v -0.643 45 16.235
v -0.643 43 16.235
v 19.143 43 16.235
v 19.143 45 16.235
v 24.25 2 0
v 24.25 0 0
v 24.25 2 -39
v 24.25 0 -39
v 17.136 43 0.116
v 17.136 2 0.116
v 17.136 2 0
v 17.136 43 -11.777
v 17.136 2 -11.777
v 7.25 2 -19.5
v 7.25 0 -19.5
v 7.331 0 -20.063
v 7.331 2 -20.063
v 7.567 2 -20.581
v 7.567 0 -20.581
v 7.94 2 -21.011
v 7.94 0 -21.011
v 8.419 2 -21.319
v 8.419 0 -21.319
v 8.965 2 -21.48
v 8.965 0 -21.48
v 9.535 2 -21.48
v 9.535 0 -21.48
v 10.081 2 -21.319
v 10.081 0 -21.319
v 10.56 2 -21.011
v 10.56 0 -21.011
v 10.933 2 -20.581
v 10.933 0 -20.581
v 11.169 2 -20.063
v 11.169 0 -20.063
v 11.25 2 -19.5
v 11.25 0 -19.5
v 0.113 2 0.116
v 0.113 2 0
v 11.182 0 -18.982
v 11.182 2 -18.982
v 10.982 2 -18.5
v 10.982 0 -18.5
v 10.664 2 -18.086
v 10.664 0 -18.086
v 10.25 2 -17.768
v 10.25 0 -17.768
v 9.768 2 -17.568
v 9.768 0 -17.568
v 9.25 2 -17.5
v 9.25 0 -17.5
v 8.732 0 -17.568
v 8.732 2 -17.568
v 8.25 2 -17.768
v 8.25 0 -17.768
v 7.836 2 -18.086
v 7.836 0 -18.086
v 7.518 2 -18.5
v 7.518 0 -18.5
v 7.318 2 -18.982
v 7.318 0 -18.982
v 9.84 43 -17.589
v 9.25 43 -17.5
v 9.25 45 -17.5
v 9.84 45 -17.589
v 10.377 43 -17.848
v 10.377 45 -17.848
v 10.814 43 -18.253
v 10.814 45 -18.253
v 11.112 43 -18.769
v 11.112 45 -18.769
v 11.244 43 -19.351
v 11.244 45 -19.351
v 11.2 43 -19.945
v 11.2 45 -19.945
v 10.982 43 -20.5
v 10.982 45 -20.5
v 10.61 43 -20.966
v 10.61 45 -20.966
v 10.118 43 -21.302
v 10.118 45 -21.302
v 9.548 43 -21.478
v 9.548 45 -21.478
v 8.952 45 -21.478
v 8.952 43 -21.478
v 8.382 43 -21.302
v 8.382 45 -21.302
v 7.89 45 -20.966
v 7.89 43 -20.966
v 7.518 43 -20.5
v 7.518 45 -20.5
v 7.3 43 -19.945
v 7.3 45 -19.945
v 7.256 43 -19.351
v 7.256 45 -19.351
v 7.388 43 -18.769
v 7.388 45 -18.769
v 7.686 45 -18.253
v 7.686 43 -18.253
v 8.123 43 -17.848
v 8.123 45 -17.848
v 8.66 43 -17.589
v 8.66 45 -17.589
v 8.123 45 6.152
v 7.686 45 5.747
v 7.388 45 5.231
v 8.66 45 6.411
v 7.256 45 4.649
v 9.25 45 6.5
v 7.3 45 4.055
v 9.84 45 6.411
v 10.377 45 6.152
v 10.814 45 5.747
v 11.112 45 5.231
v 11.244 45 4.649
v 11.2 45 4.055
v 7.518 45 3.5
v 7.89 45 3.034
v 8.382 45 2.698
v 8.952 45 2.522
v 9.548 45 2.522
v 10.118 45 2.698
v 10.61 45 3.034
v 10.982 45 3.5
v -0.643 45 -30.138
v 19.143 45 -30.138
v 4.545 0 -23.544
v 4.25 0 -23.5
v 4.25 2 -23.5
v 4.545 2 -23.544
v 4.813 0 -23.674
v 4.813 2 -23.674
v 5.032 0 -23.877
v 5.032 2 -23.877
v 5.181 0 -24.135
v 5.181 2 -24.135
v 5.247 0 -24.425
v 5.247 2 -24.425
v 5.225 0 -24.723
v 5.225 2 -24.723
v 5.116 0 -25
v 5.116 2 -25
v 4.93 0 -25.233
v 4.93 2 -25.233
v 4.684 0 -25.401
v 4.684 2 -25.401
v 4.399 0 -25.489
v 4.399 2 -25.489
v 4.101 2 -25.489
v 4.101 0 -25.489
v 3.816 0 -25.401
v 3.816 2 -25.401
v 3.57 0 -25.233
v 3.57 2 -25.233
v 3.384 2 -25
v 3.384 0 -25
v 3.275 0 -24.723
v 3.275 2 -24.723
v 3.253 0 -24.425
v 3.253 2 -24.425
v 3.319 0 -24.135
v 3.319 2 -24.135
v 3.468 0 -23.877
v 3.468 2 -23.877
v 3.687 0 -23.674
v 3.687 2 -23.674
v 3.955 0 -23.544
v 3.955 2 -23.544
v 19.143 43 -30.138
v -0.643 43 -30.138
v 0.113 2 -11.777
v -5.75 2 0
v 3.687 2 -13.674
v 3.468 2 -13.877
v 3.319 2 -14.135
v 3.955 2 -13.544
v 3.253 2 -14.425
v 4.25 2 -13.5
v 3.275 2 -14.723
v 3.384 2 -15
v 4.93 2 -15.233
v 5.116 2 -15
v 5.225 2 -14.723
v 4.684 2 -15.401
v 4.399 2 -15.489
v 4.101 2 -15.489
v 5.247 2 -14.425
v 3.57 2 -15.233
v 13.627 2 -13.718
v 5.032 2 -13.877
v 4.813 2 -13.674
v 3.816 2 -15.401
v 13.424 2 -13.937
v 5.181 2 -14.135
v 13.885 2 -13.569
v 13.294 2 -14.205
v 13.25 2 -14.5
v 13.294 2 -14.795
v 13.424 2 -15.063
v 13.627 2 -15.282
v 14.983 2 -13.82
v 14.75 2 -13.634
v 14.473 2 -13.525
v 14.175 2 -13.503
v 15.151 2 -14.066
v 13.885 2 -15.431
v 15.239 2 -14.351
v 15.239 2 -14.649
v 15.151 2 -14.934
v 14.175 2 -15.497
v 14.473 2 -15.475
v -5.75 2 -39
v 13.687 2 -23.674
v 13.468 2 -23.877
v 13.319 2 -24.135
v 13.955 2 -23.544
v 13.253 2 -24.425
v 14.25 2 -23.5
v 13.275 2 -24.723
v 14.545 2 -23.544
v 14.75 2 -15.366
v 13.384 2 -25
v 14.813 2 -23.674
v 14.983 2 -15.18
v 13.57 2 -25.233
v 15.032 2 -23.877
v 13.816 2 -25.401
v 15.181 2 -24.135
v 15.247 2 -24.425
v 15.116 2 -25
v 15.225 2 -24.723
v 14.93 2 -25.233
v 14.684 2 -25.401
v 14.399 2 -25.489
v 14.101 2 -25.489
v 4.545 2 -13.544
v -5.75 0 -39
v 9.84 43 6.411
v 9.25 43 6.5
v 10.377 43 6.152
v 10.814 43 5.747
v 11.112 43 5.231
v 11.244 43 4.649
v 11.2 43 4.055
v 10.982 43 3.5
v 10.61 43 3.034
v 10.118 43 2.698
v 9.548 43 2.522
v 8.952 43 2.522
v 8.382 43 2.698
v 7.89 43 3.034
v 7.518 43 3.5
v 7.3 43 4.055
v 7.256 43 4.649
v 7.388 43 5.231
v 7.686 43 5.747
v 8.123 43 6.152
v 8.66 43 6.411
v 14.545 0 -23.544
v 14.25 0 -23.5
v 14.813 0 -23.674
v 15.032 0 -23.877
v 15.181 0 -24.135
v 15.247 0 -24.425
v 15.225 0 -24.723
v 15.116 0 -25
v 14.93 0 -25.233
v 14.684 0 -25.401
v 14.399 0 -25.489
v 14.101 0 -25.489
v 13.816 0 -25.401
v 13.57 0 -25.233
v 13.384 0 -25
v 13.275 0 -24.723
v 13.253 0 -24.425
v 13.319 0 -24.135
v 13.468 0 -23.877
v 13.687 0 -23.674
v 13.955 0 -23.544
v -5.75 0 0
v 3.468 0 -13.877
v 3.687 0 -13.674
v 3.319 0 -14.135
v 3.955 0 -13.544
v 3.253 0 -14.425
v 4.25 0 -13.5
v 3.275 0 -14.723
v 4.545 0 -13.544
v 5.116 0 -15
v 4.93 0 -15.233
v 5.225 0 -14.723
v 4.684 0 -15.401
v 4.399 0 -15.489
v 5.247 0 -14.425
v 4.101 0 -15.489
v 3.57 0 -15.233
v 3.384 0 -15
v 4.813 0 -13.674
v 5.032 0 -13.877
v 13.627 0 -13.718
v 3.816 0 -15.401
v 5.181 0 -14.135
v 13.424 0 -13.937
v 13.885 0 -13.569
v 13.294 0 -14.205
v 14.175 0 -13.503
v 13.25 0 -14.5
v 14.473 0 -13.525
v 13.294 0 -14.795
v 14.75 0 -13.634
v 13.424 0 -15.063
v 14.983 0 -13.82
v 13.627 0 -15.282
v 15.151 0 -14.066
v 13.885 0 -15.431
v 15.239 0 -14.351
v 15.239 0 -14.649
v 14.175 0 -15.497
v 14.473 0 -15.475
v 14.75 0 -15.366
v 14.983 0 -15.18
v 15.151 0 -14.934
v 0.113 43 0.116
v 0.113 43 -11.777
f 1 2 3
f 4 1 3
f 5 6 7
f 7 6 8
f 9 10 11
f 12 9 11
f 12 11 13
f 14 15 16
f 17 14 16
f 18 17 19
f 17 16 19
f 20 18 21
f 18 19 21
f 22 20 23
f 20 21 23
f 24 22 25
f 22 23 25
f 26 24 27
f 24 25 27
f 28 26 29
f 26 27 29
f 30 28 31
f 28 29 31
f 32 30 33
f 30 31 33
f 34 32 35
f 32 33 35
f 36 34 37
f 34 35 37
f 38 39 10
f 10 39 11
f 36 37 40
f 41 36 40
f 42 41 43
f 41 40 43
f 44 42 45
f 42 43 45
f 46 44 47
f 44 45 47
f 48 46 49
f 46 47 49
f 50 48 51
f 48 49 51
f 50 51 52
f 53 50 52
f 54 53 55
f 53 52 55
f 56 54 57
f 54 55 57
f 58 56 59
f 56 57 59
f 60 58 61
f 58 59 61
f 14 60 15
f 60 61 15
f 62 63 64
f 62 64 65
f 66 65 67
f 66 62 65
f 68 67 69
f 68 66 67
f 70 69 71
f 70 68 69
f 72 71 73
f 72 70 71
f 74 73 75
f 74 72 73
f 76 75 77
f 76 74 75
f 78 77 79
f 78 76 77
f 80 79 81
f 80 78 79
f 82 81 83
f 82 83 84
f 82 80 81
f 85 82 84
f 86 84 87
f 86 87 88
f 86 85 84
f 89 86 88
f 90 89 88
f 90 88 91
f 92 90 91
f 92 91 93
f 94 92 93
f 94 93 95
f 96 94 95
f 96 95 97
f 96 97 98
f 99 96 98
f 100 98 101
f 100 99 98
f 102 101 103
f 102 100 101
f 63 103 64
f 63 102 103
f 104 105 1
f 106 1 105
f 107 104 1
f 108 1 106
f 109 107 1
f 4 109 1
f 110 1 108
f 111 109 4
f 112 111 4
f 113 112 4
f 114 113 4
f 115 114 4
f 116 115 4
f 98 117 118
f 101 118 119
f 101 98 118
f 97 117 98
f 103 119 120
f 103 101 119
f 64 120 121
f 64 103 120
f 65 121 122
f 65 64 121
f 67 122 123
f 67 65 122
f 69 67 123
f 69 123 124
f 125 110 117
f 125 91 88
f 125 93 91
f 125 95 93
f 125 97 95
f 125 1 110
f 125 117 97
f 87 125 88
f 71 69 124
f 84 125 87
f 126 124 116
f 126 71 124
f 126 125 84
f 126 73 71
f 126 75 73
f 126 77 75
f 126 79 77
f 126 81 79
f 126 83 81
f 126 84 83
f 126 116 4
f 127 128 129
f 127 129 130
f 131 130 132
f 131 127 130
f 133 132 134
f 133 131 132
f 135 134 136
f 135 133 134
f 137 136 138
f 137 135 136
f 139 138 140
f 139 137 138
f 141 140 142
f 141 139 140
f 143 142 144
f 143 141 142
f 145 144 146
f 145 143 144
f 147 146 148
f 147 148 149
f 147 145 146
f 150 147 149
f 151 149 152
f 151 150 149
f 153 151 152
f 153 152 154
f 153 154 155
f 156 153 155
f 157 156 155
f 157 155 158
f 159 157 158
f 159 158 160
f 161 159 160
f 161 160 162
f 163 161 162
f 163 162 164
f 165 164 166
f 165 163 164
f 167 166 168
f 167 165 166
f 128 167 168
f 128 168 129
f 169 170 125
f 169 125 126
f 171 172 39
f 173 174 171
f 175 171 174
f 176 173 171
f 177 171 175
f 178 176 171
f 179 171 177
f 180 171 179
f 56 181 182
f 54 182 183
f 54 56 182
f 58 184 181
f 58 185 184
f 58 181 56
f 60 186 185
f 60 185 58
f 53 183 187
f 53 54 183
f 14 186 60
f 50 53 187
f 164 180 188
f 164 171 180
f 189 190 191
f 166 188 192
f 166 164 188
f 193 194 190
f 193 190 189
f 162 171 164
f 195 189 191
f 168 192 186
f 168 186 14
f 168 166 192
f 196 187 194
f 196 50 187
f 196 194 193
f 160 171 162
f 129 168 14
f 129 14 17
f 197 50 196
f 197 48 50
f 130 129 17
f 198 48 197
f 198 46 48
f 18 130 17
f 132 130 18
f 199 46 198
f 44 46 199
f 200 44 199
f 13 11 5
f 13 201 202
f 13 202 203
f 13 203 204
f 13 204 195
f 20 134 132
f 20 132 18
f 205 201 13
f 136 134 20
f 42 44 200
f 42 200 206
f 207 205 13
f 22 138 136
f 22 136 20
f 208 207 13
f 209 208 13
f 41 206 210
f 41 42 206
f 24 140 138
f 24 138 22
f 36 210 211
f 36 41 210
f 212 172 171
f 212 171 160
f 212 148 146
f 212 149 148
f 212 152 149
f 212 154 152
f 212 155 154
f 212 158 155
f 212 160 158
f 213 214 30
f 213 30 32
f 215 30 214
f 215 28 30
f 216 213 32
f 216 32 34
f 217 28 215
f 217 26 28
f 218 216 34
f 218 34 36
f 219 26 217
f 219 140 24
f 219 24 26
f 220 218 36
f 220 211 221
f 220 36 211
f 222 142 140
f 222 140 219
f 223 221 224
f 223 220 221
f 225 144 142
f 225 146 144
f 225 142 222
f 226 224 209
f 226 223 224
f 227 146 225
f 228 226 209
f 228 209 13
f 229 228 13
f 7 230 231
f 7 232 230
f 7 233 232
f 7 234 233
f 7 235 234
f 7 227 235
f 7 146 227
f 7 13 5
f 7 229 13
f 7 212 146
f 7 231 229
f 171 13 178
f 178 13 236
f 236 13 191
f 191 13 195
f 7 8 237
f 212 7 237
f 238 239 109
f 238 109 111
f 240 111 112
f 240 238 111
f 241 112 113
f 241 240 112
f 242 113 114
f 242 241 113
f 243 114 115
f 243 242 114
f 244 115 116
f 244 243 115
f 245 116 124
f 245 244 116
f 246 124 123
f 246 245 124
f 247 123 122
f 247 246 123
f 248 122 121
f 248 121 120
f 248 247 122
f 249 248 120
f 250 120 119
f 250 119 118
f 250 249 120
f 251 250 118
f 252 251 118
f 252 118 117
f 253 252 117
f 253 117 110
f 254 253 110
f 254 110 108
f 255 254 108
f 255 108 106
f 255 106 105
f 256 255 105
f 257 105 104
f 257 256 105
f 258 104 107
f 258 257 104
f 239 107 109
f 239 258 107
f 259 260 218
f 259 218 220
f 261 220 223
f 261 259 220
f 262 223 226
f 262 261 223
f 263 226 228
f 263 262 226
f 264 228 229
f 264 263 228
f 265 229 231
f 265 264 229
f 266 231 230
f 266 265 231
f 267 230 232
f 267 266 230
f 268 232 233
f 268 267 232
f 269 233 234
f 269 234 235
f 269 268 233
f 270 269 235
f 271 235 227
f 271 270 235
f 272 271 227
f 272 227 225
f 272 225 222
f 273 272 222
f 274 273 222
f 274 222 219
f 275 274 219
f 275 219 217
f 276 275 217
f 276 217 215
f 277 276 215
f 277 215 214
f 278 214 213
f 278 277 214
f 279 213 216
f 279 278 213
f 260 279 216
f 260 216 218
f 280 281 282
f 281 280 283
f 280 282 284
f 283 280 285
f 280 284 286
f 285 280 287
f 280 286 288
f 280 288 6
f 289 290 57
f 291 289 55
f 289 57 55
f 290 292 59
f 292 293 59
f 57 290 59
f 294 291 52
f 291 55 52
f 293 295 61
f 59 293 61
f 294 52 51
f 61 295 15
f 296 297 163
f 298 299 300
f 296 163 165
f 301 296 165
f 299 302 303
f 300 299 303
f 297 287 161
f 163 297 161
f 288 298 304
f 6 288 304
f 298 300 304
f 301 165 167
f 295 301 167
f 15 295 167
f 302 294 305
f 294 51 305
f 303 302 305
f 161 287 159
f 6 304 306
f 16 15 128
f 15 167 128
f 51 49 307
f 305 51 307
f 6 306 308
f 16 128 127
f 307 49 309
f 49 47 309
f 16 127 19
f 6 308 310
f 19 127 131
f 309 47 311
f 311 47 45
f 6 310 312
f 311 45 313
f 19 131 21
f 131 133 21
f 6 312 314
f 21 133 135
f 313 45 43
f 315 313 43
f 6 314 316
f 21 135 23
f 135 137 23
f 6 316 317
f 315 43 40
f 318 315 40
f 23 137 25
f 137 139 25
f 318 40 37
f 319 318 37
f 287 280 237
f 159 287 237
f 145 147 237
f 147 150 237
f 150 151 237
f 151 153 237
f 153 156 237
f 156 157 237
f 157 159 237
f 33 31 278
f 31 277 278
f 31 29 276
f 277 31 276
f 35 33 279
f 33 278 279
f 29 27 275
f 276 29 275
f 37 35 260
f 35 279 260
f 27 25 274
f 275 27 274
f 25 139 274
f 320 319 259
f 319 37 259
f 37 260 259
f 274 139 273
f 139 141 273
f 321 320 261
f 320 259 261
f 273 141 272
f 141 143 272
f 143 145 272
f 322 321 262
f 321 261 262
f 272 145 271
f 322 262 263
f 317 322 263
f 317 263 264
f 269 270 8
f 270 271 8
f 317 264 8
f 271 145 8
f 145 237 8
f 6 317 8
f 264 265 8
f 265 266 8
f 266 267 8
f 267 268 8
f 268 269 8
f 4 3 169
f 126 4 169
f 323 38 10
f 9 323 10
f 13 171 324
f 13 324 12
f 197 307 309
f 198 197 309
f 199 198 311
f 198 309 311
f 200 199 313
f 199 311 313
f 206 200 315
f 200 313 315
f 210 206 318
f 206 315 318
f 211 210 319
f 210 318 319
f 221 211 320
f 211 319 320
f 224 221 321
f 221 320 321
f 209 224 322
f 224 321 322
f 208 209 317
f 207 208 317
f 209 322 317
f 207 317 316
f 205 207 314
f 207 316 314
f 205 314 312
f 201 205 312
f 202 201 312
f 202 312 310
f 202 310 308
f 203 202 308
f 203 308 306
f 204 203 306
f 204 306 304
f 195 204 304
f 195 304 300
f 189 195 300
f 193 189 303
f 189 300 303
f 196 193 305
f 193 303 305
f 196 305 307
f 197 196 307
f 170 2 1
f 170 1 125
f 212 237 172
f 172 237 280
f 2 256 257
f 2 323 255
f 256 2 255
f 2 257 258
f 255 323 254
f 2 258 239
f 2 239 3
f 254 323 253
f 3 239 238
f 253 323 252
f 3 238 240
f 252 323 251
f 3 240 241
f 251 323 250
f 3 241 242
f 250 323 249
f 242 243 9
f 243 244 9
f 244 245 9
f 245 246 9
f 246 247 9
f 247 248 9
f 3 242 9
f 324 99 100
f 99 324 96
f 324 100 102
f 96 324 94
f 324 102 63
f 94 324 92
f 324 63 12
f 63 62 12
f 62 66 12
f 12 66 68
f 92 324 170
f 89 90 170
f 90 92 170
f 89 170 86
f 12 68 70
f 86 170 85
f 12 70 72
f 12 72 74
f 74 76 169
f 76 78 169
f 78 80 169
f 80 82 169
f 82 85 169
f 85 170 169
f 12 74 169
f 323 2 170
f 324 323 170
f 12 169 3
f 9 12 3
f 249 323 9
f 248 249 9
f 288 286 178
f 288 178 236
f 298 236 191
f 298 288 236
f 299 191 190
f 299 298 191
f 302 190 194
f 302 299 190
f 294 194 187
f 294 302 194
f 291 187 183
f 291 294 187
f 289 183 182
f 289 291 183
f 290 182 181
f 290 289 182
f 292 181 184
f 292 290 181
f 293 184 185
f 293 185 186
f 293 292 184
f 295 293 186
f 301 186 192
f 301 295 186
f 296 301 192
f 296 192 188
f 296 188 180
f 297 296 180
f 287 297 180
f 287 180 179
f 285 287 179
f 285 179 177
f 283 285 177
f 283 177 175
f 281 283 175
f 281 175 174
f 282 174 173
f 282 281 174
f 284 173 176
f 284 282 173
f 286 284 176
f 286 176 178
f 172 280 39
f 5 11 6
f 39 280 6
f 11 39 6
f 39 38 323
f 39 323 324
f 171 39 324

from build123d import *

# Parameters (mm, degrees)
SKETCH_1_W      = 30
SKETCH_1_H      = 39
SKETCH_1_R      = 2
SKETCH_1_R_2    = 1
EXTRUDE_1_DEPTH = 2
SKETCH_2_W      = 17.022580328
SKETCH_2_H      = 11.892604249
EXTRUDE_2_DEPTH = 43
EXTRUDE_START   = -2
SKETCH_3_W      = 19.786200008
SKETCH_3_H      = 46.373293121
SKETCH_3_R      = 2
EXTRUDE_3_DEPTH = 2


with BuildPart() as part:
    # 草图1 → 凸台-拉伸1 (new body)
    with BuildSketch(Plane(origin=(0, 0, 0), x_dir=(1, 0, 0), z_dir=(0, 1, 0))):
        with Locations((9.25, 19.5)):
            Rectangle(SKETCH_1_W, SKETCH_1_H)
        with Locations((9.25, 19.5)):
            Circle(SKETCH_1_R, mode=Mode.SUBTRACT)
        with Locations((4.25, 24.5)):
            Circle(SKETCH_1_R_2, mode=Mode.SUBTRACT)
        with Locations((14.25, 24.5)):
            Circle(SKETCH_1_R_2, mode=Mode.SUBTRACT)
        with Locations((4.25, 14.5)):
            Circle(SKETCH_1_R_2, mode=Mode.SUBTRACT)
        with Locations((14.25, 14.5)):
            Circle(SKETCH_1_R_2, mode=Mode.SUBTRACT)
    extrude(amount=EXTRUDE_1_DEPTH)

    # 草图2 → 凸台-拉伸2 (add)
    with BuildSketch(Plane(origin=(0, 2, 0), x_dir=(1, 0, 0), z_dir=(0, 1, 0))):
        with Locations((8.624620537, 5.830652978)):
            Rectangle(SKETCH_2_W, SKETCH_2_H)
    extrude(amount=EXTRUDE_2_DEPTH)

    # 草图3 → 凸台-拉伸3 (add)
    with BuildSketch(Plane(origin=(0, 45, 0), x_dir=(1, 0, 0), z_dir=(0, 1, 0)).offset(EXTRUDE_START)):
        with Locations((9.25, 6.951413881)):
            Rectangle(SKETCH_3_W, SKETCH_3_H)
        with Locations((9.25, -4.5)):
            Circle(SKETCH_3_R, mode=Mode.SUBTRACT)
        with BuildLine():
            ThreePointArc((9.25, 21.5), (10.664213562, 20.914213562), (11.25, 19.5))
            ThreePointArc((11.25, 19.5), (7.835786438, 18.085786438), (9.25, 21.5))
        make_face(mode=Mode.SUBTRACT)
    extrude(amount=EXTRUDE_3_DEPTH)


solid = part.part
